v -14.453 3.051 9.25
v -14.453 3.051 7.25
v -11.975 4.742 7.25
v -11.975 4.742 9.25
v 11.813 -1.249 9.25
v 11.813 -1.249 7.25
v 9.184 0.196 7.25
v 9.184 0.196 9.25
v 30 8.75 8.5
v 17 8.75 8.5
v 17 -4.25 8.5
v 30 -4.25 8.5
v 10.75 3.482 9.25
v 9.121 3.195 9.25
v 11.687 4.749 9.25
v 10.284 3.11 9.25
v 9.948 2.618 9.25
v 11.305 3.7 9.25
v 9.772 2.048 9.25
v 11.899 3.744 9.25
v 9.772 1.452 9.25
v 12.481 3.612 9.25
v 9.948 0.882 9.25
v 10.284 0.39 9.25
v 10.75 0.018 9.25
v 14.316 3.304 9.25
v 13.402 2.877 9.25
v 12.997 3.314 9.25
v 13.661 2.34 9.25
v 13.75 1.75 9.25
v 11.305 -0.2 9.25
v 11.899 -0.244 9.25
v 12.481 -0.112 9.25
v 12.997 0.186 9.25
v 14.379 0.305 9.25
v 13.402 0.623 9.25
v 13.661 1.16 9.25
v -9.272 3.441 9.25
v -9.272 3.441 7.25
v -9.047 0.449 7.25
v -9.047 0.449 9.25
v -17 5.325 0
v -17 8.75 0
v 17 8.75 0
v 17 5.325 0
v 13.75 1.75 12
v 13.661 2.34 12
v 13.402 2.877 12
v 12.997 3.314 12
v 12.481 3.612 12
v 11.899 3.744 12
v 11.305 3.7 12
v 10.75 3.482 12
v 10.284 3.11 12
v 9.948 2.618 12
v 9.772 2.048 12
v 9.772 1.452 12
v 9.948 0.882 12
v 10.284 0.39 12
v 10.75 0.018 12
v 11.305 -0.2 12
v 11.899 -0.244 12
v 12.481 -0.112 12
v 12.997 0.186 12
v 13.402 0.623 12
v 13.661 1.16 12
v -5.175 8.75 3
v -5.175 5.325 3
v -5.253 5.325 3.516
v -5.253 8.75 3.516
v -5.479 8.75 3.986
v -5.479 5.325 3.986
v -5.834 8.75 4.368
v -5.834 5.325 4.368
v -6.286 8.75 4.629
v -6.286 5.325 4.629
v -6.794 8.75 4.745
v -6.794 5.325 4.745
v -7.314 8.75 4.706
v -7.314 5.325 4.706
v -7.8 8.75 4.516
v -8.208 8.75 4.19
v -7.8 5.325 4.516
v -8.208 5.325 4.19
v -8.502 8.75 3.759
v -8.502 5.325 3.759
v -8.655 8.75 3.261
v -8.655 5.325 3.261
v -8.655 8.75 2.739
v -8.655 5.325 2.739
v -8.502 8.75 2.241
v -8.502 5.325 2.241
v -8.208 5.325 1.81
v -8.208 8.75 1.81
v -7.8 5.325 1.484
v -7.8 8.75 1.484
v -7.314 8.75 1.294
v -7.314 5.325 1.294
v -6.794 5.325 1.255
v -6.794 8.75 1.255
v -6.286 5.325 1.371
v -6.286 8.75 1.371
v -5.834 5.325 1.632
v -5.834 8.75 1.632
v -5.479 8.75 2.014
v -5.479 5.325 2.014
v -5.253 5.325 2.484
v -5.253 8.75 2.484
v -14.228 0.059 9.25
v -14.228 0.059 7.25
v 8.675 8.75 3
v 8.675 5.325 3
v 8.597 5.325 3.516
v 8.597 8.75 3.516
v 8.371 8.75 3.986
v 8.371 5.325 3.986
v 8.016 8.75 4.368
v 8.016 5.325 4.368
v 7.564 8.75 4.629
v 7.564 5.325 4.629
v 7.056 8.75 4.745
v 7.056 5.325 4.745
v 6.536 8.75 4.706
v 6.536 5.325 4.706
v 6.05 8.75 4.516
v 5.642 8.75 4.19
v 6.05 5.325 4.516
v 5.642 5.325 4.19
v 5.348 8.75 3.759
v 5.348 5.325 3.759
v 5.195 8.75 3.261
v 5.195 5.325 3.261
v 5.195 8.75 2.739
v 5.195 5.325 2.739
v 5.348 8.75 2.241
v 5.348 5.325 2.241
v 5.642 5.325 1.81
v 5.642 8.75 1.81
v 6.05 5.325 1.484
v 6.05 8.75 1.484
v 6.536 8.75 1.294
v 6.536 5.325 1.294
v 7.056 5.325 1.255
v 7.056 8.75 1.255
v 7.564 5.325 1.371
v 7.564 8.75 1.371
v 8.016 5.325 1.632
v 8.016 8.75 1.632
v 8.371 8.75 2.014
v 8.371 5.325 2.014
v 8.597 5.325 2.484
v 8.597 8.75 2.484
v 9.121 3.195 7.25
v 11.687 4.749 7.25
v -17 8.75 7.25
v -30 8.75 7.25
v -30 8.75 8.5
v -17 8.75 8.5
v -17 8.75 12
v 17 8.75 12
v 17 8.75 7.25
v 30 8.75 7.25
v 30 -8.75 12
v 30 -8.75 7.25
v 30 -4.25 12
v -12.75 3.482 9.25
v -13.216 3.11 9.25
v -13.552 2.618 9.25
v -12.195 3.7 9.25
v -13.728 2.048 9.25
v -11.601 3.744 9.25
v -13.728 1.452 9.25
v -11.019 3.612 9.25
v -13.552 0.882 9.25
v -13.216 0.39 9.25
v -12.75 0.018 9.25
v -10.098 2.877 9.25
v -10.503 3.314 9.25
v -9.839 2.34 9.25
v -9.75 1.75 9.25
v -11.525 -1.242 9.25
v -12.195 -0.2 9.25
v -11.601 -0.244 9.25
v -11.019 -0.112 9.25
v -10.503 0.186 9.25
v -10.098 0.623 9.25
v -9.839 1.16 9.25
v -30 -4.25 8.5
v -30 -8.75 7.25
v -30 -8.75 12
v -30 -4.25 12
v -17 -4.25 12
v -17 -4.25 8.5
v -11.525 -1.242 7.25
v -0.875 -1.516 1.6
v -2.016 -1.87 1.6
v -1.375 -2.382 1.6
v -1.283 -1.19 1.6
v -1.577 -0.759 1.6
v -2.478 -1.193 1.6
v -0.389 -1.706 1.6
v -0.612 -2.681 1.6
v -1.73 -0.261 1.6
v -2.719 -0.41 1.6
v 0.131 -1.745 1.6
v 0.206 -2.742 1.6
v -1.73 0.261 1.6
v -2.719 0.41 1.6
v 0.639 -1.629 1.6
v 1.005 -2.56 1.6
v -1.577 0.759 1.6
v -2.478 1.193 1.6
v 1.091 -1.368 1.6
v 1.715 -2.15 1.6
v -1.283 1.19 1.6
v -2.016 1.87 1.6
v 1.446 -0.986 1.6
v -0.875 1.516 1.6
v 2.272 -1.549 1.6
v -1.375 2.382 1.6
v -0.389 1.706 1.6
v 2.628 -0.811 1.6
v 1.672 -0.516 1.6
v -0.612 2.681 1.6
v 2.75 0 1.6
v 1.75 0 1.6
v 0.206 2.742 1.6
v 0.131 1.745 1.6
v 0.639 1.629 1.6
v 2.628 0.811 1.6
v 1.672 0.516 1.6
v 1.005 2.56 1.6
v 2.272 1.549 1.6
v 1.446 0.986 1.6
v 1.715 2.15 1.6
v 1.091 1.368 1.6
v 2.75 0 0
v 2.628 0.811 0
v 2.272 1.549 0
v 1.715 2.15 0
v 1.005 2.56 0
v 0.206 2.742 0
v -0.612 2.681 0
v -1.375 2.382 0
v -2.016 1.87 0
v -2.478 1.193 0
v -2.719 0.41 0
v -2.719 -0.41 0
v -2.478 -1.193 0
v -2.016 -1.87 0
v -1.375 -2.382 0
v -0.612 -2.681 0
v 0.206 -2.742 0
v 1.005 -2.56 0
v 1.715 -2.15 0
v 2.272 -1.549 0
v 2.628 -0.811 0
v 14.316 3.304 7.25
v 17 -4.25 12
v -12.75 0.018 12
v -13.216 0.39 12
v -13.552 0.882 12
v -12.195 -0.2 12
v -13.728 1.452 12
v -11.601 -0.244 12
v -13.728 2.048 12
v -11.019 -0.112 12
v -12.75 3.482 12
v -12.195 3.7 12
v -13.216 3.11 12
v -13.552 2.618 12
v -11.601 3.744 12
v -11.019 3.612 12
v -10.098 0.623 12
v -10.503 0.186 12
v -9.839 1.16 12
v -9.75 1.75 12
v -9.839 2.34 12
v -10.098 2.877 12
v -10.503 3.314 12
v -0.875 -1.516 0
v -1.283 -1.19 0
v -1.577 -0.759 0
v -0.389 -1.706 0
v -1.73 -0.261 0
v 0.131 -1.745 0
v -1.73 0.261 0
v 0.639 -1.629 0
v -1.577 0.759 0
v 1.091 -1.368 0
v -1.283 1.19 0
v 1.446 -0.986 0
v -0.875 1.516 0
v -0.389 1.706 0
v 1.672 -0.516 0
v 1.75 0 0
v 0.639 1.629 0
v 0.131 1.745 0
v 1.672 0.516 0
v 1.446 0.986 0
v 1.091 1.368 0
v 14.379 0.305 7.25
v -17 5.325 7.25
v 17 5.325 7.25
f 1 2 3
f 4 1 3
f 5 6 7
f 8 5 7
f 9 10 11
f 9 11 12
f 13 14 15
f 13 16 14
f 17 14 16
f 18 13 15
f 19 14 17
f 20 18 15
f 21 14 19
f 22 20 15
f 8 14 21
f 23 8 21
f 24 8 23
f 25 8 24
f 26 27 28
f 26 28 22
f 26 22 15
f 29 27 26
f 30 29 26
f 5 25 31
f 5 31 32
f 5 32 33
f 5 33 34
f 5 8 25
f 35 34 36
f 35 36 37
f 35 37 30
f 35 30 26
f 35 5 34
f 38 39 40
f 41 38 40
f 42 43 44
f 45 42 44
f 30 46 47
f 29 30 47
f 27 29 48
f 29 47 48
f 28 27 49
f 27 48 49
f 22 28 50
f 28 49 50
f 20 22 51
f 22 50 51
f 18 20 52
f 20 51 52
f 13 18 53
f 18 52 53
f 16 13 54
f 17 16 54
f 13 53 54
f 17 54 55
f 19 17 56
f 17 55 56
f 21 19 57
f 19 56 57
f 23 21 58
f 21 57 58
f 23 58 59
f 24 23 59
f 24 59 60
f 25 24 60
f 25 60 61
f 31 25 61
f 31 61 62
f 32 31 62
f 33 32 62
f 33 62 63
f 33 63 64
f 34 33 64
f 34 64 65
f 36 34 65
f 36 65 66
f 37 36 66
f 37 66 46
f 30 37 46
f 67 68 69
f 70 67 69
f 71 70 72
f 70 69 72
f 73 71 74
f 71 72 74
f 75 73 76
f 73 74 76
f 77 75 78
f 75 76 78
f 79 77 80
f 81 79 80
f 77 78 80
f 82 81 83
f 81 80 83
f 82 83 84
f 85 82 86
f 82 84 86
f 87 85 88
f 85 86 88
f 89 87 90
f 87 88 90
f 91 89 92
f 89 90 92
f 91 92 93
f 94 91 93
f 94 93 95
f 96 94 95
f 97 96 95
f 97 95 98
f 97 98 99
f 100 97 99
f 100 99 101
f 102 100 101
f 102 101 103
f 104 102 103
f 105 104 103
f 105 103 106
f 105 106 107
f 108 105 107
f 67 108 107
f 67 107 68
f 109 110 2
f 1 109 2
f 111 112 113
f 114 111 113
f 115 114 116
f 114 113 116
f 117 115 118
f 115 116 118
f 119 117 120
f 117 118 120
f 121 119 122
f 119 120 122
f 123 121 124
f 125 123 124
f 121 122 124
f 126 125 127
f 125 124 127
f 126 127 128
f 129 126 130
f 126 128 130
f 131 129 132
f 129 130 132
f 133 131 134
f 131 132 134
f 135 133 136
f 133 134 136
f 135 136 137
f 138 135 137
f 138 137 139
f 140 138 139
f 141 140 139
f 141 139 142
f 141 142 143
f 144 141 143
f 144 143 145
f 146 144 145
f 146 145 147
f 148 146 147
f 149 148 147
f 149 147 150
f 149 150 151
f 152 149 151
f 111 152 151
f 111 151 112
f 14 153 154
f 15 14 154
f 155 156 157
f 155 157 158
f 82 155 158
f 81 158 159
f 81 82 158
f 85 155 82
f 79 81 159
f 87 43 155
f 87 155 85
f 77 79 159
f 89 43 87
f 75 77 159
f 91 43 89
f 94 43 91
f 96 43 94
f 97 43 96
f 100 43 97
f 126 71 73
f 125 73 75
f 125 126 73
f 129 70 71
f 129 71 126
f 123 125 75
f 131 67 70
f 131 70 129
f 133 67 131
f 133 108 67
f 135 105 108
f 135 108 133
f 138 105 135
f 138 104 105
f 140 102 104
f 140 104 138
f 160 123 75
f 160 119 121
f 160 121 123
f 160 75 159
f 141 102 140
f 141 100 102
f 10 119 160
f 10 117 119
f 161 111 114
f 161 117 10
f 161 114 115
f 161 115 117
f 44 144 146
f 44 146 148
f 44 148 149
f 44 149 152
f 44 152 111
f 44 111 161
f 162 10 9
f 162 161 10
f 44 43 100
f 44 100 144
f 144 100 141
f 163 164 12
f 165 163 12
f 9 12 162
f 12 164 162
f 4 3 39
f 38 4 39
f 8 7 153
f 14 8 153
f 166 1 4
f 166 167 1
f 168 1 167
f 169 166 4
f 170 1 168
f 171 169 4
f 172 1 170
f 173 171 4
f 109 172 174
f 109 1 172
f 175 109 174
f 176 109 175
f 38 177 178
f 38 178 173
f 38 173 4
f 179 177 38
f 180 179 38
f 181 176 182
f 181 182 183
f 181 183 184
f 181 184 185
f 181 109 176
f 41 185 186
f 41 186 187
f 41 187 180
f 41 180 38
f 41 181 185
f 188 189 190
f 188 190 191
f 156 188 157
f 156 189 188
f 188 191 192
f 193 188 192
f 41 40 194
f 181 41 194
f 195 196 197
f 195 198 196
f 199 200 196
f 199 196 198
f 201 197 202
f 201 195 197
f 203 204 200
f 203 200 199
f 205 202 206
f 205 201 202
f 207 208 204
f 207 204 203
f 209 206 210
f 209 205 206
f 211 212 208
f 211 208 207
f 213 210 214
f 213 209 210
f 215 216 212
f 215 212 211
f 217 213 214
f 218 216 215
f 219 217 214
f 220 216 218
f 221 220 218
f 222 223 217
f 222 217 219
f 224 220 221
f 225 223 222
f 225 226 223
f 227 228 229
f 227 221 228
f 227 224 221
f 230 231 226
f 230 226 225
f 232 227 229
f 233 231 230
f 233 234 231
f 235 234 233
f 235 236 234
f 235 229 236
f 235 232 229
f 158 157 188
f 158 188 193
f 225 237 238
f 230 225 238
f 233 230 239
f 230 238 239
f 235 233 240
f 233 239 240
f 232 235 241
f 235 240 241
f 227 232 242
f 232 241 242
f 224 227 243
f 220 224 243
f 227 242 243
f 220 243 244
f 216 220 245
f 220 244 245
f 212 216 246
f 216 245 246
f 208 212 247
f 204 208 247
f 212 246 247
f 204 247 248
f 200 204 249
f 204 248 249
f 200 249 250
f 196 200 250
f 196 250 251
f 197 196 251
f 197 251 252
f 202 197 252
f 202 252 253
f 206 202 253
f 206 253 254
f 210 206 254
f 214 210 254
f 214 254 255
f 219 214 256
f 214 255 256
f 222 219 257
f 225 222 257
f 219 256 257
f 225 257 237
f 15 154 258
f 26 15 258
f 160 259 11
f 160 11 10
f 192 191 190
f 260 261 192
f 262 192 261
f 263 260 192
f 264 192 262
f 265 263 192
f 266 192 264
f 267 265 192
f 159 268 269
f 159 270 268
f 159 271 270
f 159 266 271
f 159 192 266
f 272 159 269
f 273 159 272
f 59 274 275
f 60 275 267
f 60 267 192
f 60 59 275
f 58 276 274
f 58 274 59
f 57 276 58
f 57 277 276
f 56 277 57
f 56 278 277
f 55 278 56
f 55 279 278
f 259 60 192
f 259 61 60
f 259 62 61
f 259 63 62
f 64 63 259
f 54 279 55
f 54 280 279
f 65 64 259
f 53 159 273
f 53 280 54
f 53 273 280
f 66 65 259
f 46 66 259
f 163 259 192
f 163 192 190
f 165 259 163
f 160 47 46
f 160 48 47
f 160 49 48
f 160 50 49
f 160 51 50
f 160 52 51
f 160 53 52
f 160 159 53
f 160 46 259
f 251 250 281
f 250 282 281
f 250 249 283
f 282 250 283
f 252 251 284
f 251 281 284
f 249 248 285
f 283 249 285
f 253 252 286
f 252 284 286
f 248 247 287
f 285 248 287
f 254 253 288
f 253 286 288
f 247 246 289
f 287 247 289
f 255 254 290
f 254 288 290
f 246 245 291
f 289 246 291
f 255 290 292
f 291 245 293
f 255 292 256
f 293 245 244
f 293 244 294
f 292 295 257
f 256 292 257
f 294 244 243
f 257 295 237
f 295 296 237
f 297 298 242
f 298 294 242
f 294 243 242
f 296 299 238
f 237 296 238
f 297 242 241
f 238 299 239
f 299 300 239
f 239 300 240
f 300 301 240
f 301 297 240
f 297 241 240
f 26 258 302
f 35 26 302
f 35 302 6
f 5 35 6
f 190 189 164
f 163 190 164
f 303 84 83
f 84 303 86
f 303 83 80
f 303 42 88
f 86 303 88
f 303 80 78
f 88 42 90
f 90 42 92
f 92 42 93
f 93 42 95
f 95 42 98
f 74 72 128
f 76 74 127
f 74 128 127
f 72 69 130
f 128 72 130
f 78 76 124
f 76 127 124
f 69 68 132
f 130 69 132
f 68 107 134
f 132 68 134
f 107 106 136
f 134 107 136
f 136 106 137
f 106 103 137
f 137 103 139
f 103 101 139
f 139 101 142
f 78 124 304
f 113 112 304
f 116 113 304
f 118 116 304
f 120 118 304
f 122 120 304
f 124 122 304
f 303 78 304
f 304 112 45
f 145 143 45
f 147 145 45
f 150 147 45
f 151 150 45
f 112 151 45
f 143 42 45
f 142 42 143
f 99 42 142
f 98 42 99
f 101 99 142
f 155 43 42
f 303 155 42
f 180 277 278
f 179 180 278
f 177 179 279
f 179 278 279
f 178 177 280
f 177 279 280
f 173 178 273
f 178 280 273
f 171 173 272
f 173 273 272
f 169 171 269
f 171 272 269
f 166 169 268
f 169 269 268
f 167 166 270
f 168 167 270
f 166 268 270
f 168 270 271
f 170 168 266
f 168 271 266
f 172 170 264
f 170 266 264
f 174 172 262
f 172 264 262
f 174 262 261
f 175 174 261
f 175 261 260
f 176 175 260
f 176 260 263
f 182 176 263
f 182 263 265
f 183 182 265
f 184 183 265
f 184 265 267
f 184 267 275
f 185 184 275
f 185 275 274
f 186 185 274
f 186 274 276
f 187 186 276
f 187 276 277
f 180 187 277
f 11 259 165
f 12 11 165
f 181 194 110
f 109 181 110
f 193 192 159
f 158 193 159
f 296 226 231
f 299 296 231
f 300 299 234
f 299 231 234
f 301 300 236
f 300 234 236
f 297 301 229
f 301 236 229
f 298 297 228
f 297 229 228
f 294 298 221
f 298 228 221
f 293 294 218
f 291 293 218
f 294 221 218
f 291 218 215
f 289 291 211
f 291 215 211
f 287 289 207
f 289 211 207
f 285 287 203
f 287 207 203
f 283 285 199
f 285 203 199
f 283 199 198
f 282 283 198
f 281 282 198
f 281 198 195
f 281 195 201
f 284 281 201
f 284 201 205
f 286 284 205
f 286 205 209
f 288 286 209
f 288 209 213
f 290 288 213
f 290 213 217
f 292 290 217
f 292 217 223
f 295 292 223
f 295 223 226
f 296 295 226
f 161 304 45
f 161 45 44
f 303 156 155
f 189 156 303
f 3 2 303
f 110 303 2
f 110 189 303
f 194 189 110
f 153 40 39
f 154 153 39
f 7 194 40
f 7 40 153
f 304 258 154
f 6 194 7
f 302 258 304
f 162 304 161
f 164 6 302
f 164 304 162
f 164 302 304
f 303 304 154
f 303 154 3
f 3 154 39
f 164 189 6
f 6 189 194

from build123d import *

# Parameters (mm, degrees)
SKETCH_W        = 60
SKETCH_H        = 17.5
PAD_DEPTH       = 12
SKETCH001_R     = 2
POCKET_DEPTH    = 12.001
SKETCH002_W     = 13
SKETCH002_H     = 13
POCKET001_DEPTH = 3.5
POCKET002_DEPTH = 7.25
POCKET003_DEPTH = 2
SKETCH005_R     = 1.75
POCKET004_DEPTH = 5
SKETCH006_R     = 2.75
PAD001_DEPTH    = 1.6
SKETCH007_R     = 1.75
POCKET005_DEPTH = 5


with BuildPart() as body:
    # Sketch → Pad (new body)
    with BuildSketch(Plane.XY):
        Rectangle(SKETCH_W, SKETCH_H)
    extrude(amount=PAD_DEPTH)

    # Sketch001 (on Face6 of Pad) → Pocket (cut, through all)
    with BuildSketch(Plane.XY.offset(12)):
        with Locations((-11.75, 1.75)):
            Circle(SKETCH001_R)
        with Locations((11.75, 1.75)):
            Circle(SKETCH001_R)
    extrude(amount=-POCKET_DEPTH, mode=Mode.SUBTRACT)

    # Sketch002 (on Face5 of Pocket) → Pocket001 (cut)
    with BuildSketch(Plane.XY.offset(12)):
        with Locations((-23.5, 2.25)):
            Rectangle(SKETCH002_W, SKETCH002_H)
        with Locations((23.5, 2.25)):
            Rectangle(SKETCH002_W, SKETCH002_H)
    extrude(amount=-POCKET001_DEPTH, mode=Mode.SUBTRACT)

    # Sketch003 (on Face2 of Pocket001) → Pocket002 (cut)
    with BuildSketch(Plane(origin=(0, 0, 0), x_dir=(1, 0, 0), z_dir=(0, 0, -1))):
        Polygon((-30, 8.75), (-30, -8.75), (-17, -8.75), (-17, -5.325445), (17, -5.325445), (17, -8.75), (30, -8.75), (30, 8.75), align=None)
    extrude(amount=-POCKET002_DEPTH, mode=Mode.SUBTRACT)

    # Sketch004 (on Face2 of Pocket002) → Pocket003 (cut)
    with BuildSketch(Plane(origin=(0, 0, 7.25), x_dir=(1, 0, 0), z_dir=(0, 0, -1))):
        Polygon((-9.271977, -3.440977), (-9.04656, -0.449458), (-11.524582, 1.241519), (-14.228023, -0.059023), (-14.45344, -3.050542), (-11.975418, -4.741519), align=None)
        Polygon((14.316039, -3.30417), (14.37897, -0.30483), (11.812931, 1.24934), (9.183961, -0.19583), (9.12103, -3.19517), (11.687069, -4.74934), align=None)
    extrude(amount=-POCKET003_DEPTH, mode=Mode.SUBTRACT)

    # Sketch005 (on Face10 of Pocket003) → Pocket004 (cut)
    with BuildSketch(Plane.XZ.offset(-5.325445)):
        with Locations((-6.925, 3)):
            Circle(SKETCH005_R)
        with Locations((6.925, 3)):
            Circle(SKETCH005_R)
    extrude(amount=-POCKET004_DEPTH, mode=Mode.SUBTRACT)


with BuildPart() as washer:
    # Sketch006 → Pad001 (new body)
    with BuildSketch(Plane.XY):
        Circle(SKETCH006_R)
    extrude(amount=PAD001_DEPTH)

    # Sketch007 (on Face3 of Pad001) → Pocket005 (cut)
    with BuildSketch(Plane.XY.offset(1.6)):
        Circle(SKETCH007_R)
    extrude(amount=-POCKET005_DEPTH, mode=Mode.SUBTRACT)


solid = Compound([body.part, washer.part])
